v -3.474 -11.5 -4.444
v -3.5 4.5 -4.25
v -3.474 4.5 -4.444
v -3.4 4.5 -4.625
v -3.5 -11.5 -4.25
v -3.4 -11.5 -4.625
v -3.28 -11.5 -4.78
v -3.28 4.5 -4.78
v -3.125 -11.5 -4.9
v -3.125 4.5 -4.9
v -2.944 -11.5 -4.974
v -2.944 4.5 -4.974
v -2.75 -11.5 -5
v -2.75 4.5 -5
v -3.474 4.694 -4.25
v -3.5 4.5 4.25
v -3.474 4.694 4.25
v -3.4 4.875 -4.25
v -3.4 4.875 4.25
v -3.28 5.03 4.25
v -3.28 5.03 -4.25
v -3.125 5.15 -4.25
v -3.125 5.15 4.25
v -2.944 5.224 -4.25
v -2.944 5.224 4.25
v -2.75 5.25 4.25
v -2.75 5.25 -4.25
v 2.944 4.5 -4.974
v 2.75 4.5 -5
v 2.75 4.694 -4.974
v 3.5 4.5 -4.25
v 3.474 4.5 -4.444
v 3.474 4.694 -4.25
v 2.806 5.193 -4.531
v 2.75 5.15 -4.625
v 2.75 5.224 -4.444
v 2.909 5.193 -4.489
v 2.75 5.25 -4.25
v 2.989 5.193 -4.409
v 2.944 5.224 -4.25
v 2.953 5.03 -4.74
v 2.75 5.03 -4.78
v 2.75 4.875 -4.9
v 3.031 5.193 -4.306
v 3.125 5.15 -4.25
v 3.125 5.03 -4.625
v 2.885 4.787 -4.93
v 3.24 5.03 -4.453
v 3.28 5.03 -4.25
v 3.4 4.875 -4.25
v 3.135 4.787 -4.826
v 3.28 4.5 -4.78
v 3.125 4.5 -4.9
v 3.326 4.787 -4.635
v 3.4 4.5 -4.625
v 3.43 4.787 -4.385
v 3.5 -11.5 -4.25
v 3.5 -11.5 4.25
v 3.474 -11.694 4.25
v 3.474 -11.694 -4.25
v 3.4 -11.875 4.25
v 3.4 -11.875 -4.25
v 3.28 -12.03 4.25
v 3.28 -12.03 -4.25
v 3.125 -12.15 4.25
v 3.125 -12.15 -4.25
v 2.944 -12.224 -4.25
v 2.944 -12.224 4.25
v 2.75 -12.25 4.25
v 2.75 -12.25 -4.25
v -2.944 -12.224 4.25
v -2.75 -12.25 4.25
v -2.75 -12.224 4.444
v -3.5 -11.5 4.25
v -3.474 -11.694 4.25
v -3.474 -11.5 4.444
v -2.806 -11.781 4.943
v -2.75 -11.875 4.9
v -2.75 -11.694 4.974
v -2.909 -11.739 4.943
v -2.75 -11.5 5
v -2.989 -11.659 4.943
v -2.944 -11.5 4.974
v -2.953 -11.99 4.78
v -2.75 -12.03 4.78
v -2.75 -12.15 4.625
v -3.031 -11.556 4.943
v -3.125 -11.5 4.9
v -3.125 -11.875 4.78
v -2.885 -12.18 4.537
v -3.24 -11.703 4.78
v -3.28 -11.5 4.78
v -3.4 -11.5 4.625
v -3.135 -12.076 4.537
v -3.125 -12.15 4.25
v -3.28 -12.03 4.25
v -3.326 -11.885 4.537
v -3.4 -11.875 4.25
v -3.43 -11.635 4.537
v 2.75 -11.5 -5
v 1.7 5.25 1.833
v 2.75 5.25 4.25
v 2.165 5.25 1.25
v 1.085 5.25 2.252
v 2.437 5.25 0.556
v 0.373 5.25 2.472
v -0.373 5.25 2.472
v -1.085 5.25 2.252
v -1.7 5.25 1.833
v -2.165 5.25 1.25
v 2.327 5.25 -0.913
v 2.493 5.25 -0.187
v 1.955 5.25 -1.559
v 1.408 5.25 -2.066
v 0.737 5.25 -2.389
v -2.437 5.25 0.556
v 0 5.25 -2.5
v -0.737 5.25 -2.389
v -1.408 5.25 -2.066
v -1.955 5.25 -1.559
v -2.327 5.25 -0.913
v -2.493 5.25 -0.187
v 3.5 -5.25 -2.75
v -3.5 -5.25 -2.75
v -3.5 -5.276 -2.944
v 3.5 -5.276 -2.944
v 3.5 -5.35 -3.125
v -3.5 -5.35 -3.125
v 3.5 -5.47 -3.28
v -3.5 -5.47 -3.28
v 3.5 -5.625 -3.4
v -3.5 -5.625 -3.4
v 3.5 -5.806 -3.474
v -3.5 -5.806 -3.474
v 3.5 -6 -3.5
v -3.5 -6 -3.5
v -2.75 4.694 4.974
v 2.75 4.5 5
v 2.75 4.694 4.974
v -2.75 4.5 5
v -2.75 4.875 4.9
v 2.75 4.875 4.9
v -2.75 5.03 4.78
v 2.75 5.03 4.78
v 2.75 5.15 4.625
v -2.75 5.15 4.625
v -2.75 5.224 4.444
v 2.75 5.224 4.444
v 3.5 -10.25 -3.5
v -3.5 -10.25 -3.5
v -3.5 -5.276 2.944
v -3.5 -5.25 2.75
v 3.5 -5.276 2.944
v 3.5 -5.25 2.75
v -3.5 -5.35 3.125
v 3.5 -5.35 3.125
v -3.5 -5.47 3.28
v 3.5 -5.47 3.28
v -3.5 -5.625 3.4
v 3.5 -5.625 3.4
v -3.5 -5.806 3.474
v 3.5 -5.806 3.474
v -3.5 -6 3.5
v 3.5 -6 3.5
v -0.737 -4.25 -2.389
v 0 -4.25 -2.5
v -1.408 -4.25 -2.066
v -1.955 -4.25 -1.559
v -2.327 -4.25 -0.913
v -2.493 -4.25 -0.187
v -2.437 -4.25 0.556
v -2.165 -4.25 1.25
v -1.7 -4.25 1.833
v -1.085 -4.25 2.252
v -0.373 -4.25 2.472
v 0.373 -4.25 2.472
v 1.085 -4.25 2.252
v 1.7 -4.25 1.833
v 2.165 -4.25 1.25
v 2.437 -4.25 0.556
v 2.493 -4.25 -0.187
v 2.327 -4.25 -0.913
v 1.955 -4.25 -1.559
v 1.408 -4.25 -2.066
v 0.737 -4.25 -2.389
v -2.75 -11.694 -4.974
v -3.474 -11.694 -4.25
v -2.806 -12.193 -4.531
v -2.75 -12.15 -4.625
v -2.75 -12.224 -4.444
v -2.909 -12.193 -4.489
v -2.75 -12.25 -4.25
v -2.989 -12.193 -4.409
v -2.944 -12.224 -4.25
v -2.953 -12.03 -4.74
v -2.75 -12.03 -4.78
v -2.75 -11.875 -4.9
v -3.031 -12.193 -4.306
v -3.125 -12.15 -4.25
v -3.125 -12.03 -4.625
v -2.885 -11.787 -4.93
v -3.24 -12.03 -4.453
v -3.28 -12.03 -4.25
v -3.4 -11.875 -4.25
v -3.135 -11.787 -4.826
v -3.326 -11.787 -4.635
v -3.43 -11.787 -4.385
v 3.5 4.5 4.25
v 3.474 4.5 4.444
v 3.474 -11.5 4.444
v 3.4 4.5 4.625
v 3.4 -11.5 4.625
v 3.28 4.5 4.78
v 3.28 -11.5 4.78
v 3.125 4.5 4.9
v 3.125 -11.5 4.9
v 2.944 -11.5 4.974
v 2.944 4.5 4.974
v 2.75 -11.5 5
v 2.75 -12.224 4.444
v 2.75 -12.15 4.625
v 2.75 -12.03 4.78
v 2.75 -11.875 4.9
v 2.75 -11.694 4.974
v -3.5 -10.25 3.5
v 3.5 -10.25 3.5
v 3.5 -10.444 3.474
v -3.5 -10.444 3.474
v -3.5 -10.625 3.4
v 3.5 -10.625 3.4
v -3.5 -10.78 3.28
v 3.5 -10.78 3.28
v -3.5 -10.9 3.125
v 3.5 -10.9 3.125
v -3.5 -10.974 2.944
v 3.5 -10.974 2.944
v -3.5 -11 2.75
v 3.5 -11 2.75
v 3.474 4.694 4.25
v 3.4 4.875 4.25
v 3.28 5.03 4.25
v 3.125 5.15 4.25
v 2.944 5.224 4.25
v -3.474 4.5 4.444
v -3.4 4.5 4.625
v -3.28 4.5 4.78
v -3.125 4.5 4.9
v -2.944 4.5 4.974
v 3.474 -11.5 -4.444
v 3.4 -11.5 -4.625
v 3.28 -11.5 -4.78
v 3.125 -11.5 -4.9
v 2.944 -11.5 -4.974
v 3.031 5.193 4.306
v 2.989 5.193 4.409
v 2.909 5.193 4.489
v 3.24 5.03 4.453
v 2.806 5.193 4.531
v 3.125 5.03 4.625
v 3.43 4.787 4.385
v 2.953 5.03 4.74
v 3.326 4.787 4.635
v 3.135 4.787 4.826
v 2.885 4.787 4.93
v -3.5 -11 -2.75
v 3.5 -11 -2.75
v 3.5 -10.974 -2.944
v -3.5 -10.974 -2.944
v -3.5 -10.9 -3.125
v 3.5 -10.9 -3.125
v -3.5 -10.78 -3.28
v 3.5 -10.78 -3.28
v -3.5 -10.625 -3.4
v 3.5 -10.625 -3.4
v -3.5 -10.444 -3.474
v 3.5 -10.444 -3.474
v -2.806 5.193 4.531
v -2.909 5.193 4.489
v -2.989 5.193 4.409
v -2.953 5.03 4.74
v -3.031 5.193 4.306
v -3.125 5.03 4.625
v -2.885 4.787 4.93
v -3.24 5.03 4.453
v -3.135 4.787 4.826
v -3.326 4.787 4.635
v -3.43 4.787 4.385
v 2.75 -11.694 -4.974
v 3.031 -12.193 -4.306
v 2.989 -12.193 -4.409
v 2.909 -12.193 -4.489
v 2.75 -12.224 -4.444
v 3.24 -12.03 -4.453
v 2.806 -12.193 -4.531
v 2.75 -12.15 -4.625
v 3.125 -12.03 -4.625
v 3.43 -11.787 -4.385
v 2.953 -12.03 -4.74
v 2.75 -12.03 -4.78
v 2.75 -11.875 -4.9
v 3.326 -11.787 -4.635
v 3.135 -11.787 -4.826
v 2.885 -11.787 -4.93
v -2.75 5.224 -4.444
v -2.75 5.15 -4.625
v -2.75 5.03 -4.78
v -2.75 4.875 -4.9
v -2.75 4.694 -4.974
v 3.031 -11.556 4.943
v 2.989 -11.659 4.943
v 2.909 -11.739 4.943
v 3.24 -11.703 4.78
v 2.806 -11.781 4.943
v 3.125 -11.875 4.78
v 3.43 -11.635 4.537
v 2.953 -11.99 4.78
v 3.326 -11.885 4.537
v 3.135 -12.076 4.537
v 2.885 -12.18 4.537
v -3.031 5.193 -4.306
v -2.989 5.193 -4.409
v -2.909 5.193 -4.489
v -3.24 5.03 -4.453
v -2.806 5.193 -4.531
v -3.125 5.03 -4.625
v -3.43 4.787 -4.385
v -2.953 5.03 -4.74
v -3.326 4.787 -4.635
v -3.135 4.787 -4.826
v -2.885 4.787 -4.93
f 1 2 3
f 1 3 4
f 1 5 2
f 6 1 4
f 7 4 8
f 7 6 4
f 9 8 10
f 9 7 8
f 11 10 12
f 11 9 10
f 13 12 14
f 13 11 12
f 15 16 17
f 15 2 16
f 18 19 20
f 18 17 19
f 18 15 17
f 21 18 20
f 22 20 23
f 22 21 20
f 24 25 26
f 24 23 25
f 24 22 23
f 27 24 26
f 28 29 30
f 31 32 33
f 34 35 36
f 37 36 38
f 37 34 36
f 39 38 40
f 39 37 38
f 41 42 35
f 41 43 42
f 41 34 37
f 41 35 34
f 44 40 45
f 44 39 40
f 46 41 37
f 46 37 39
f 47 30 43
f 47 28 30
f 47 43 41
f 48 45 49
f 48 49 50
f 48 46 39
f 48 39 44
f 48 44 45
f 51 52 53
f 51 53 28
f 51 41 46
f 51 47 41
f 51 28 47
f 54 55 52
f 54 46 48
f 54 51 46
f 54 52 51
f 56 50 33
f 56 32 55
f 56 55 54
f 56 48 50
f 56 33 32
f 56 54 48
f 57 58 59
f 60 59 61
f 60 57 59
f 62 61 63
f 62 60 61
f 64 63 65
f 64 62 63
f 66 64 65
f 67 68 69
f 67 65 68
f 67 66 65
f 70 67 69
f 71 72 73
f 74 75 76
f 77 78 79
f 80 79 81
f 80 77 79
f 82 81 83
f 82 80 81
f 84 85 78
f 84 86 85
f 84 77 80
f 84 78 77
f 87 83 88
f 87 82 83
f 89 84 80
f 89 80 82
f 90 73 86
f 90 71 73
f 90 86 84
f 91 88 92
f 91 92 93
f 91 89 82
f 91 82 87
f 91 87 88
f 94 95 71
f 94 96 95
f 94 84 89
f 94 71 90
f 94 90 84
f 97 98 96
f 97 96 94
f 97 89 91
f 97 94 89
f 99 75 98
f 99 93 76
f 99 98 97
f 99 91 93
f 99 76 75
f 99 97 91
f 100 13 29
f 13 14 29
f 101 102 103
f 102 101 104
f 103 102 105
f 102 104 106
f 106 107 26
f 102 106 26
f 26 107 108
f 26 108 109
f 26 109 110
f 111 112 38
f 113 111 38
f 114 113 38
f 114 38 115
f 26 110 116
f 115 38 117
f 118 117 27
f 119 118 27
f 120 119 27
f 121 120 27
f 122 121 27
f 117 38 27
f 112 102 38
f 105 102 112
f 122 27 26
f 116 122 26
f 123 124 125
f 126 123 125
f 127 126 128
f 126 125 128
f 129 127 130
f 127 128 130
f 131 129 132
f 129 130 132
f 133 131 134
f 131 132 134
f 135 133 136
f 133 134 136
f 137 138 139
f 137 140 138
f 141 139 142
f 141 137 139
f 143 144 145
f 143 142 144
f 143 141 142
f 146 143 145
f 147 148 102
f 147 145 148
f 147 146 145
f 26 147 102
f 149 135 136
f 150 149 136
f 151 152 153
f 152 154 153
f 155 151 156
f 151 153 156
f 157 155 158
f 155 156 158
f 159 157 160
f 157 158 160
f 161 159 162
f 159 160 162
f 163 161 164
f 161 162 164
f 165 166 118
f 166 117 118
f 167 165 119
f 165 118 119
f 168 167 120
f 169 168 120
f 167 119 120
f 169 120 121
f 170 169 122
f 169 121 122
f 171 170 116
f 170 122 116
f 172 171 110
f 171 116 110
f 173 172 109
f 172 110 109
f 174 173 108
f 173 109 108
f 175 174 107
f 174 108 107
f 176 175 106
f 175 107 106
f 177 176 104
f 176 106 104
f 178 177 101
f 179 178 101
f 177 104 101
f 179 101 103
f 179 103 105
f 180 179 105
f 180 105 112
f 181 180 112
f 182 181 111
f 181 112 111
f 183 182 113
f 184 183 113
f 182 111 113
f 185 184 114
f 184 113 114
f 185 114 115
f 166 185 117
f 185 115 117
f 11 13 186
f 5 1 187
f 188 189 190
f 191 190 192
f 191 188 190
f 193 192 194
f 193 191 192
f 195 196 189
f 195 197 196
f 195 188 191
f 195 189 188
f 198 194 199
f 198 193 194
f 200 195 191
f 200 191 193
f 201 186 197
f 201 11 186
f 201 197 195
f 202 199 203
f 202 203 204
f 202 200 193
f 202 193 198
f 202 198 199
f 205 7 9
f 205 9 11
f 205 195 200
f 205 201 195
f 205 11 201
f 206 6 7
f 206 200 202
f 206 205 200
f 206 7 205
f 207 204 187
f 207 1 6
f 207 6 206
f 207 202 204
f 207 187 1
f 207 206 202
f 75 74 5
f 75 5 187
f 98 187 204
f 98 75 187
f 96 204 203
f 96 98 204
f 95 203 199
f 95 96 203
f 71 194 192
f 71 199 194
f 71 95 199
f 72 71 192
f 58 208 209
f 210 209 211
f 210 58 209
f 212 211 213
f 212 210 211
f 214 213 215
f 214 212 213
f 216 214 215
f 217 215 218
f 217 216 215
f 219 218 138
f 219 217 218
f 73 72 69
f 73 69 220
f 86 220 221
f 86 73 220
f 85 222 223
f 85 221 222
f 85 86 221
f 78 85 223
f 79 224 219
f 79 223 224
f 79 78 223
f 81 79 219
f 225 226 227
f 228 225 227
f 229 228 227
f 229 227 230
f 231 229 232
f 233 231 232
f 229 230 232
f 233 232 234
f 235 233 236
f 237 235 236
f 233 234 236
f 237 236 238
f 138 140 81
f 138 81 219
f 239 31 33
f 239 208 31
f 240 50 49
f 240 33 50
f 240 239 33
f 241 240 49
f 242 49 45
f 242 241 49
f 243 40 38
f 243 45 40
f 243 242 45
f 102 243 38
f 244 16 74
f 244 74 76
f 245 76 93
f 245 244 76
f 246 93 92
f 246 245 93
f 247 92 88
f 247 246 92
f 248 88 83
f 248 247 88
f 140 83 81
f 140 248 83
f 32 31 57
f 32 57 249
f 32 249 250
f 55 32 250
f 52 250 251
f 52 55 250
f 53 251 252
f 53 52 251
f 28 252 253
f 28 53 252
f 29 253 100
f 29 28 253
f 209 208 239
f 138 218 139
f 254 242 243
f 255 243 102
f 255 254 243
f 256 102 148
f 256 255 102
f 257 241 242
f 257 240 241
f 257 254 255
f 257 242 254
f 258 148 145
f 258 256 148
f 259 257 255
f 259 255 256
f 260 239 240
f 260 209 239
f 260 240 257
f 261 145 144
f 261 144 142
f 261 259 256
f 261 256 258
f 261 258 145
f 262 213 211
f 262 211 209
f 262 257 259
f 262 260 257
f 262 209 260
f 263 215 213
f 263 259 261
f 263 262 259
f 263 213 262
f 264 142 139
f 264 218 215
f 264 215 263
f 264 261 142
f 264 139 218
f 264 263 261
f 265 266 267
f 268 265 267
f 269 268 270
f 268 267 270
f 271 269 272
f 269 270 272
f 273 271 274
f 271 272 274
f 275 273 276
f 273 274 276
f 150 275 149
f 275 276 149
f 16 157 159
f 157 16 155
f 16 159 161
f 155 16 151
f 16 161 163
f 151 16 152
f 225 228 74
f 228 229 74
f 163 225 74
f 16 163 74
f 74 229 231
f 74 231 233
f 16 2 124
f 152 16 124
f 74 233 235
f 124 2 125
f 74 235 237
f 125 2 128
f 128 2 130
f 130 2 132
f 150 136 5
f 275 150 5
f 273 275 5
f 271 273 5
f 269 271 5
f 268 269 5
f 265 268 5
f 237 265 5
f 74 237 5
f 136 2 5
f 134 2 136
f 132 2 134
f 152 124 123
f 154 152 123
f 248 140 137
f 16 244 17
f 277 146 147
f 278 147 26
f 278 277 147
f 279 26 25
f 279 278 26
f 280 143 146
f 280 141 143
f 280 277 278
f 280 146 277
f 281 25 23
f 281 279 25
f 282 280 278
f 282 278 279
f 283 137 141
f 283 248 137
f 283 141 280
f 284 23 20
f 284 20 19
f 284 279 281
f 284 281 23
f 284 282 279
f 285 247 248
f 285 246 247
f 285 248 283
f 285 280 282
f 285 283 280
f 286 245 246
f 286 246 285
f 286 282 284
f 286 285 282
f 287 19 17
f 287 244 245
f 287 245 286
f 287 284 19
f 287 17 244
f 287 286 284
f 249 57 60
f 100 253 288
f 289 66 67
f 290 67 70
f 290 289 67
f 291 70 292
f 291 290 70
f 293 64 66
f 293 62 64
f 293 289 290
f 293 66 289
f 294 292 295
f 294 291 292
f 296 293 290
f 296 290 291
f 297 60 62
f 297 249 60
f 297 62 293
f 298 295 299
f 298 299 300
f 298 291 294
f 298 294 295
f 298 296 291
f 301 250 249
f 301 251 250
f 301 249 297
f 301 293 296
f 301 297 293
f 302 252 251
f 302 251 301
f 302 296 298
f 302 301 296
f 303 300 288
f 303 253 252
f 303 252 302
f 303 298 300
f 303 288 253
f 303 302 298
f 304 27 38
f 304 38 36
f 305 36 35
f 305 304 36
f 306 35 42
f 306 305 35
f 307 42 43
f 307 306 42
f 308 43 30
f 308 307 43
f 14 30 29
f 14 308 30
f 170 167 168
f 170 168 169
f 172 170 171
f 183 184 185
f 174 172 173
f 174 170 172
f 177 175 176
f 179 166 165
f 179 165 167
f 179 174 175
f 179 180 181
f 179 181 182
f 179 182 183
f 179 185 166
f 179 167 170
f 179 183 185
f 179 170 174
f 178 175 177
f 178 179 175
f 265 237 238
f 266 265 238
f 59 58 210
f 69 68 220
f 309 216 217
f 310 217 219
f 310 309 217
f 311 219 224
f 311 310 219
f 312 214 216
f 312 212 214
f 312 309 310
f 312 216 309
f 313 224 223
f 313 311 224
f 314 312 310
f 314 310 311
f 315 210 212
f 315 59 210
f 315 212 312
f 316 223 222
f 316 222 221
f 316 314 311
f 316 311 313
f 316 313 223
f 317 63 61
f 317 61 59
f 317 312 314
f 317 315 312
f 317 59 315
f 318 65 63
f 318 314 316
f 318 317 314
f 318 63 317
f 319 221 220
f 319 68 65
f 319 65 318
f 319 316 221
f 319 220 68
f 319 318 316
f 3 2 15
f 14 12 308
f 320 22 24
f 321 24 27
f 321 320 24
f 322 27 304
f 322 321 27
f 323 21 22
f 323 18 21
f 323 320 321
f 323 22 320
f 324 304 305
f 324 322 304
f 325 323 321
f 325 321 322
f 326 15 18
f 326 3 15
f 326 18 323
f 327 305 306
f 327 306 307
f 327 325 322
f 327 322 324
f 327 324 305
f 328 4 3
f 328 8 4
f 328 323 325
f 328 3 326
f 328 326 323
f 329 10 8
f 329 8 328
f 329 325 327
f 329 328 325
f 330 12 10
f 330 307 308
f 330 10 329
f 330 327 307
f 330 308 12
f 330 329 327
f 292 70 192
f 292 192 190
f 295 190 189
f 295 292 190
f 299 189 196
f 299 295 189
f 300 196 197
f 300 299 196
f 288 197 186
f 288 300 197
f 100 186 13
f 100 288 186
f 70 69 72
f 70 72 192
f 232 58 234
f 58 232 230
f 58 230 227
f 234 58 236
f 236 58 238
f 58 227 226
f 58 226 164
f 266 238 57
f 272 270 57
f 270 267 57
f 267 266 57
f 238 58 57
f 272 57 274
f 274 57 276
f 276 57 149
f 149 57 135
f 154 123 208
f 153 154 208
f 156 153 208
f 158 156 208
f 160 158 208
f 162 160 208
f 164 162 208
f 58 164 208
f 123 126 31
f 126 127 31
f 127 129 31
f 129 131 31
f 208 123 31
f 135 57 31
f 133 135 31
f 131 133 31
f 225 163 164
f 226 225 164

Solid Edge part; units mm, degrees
sketch "Sketch1" plane through (0, 0, 0) normal (0, 0, 1) x (1, 0, 0)
  line L0 (-3.5, -5.25) -> (3.5, -5.25)
  line L1 (3.5, -5.25) -> (3.5, 5.25)
  line L2 (3.5, 5.25) -> (-3.5, 5.25)
  line L3 (-3.5, 5.25) -> (-3.5, -5.25)
extrude "Protrusion1" add sketch "Sketch1" along normal mid plane 10
sketch "Sketch2" plane through (0, 5.25, 0) normal (0, 1, 0) x (0, 0, -1)
  circle A0 centre (0, 0) radius 2.5
extrude "ExtrudedCutout_3" cut sketch "Sketch2" against normal blind 9.5
sketch "Sketch3" plane through (0, -5.25, 0) normal (0, -1, 0) x (-1, 0, 0)
  line L0 (-3.5, 3.5) -> (3.5, 3.5)
  line L1 (3.5, 3.5) -> (3.5, 5)
  line L2 (3.5, 5) -> (-3.5, 5)
  line L3 (-3.5, 5) -> (-3.5, 3.5)
  line L4 (3.5, -3.5) -> (-3.5, -3.5)
  line L5 (-3.5, -3.5) -> (-3.5, -5)
  line L6 (-3.5, -5) -> (3.5, -5)
  line L7 (3.5, -5) -> (3.5, -3.5)
  dimension "D1" = 1.5
  dimension "D2" = 7
extrude "ExtrudedProtrusion_2" add sketch "Sketch3" along normal blind 7
sketch "Sketch4" plane through (0, -10.25, 3.5) normal (0, 0, -1) x (0, -1, 0)
  line L0 (0.75, -3.5) -> (2, -3.5)
  line L1 (2, -3.5) -> (2, 3.5)
  line L2 (2, 3.5) -> (0.75, 3.5)
  line L3 (0.75, 3.5) -> (0.75, -3.5)
extrude "Protrusion2" add sketch "Sketch4" along normal up to vertex (7 mm away)
fillet "Round_1" radius 0.75 16 edges at (3.5, -3.5, -5) (-3.5, -3.5, -5) (3.5, -12.25, 0) (-3.5, -12.25, 0) (0, -12.25, -5) (0, -12.25, 5) (-3.5, -3.5, 5) (0, -11, 3.5) (0, -11, -3.5) (0, -5.25, -3.5) (0, -5.25, 3.5) (3.5, -3.5, 5) (0, 5.25, 5) (-3.5, 5.25, 0) (3.5, 5.25, 0) (0, 5.25, -5)
properties material "ABS Plastic, medium impact"
